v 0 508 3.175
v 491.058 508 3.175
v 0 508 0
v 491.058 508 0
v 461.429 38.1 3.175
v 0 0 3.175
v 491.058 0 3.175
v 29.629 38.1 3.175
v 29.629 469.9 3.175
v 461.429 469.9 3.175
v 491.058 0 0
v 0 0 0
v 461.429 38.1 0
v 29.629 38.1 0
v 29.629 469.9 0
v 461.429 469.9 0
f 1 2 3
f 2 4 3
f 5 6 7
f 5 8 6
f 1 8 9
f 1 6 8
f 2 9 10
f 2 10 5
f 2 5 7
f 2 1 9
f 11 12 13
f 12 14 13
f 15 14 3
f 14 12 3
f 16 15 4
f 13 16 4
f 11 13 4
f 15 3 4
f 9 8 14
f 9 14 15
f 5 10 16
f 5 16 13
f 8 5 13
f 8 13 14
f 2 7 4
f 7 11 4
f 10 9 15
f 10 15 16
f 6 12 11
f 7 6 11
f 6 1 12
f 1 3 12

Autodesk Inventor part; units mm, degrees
ref_plane "YZ Plane" through (0, 0, 0) normal (1, 0, 0) x (0, 1, 0)
ref_plane "XZ Plane" through (0, 0, 0) normal (0, 1, 0) x (-1, 0, 0)
ref_plane "XY Plane" through (0, 0, 0) normal (0, 0, 1) x (1, 0, 0)
sketch "Sketch1" plane through (0, 0, 0) normal (0, 0, 1) x (1, 0, 0)
  line L0 (0, 0) -> (491.0582, 0)
  line L1 (491.0582, 0) -> (491.0582, 508)
  line L2 (491.0582, 508) -> (0, 508)
  line L3 (0, 508) -> (0, 0)
  dimension "d0" = 491.0582
  dimension "d1" = 508
extrude "Extrusion1" add sketch "Sketch1" along normal blind 3.175
sketch "Sketch2" plane through (0, 0, 3.175) normal (0, 0, 1) x (1, 0, 0)
  line L0 (29.6291, 469.9) -> (461.4291, 469.9)
  line L1 (461.4291, 469.9) -> (461.4291, 38.1)
  line L2 (461.4291, 38.1) -> (29.6291, 38.1)
  line L3 (29.6291, 38.1) -> (29.6291, 469.9)
  line L4 (245.5291, 38.1) -> (245.5291, 0)
  line L5 (0, 0) -> (491.0582, 0) projected
  line L6 (245.5291, 469.9) -> (245.5291, 508)
  line L7 (491.0582, 508) -> (0, 508) projected
  line L8 (29.6291, 254) -> (0, 254)
  line L9 (0, 508) -> (0, 0) projected
  line L10 (461.4291, 254) -> (491.0582, 254)
  line L11 (491.0582, 0) -> (491.0582, 508) projected
  dimension "d4" = 431.8
  dimension "d5" = 431.8
extrude "Extrusion2" cut sketch "Sketch2" against normal blind 3.175 contours L0 L1 L2 L3
properties part number "window outer"
